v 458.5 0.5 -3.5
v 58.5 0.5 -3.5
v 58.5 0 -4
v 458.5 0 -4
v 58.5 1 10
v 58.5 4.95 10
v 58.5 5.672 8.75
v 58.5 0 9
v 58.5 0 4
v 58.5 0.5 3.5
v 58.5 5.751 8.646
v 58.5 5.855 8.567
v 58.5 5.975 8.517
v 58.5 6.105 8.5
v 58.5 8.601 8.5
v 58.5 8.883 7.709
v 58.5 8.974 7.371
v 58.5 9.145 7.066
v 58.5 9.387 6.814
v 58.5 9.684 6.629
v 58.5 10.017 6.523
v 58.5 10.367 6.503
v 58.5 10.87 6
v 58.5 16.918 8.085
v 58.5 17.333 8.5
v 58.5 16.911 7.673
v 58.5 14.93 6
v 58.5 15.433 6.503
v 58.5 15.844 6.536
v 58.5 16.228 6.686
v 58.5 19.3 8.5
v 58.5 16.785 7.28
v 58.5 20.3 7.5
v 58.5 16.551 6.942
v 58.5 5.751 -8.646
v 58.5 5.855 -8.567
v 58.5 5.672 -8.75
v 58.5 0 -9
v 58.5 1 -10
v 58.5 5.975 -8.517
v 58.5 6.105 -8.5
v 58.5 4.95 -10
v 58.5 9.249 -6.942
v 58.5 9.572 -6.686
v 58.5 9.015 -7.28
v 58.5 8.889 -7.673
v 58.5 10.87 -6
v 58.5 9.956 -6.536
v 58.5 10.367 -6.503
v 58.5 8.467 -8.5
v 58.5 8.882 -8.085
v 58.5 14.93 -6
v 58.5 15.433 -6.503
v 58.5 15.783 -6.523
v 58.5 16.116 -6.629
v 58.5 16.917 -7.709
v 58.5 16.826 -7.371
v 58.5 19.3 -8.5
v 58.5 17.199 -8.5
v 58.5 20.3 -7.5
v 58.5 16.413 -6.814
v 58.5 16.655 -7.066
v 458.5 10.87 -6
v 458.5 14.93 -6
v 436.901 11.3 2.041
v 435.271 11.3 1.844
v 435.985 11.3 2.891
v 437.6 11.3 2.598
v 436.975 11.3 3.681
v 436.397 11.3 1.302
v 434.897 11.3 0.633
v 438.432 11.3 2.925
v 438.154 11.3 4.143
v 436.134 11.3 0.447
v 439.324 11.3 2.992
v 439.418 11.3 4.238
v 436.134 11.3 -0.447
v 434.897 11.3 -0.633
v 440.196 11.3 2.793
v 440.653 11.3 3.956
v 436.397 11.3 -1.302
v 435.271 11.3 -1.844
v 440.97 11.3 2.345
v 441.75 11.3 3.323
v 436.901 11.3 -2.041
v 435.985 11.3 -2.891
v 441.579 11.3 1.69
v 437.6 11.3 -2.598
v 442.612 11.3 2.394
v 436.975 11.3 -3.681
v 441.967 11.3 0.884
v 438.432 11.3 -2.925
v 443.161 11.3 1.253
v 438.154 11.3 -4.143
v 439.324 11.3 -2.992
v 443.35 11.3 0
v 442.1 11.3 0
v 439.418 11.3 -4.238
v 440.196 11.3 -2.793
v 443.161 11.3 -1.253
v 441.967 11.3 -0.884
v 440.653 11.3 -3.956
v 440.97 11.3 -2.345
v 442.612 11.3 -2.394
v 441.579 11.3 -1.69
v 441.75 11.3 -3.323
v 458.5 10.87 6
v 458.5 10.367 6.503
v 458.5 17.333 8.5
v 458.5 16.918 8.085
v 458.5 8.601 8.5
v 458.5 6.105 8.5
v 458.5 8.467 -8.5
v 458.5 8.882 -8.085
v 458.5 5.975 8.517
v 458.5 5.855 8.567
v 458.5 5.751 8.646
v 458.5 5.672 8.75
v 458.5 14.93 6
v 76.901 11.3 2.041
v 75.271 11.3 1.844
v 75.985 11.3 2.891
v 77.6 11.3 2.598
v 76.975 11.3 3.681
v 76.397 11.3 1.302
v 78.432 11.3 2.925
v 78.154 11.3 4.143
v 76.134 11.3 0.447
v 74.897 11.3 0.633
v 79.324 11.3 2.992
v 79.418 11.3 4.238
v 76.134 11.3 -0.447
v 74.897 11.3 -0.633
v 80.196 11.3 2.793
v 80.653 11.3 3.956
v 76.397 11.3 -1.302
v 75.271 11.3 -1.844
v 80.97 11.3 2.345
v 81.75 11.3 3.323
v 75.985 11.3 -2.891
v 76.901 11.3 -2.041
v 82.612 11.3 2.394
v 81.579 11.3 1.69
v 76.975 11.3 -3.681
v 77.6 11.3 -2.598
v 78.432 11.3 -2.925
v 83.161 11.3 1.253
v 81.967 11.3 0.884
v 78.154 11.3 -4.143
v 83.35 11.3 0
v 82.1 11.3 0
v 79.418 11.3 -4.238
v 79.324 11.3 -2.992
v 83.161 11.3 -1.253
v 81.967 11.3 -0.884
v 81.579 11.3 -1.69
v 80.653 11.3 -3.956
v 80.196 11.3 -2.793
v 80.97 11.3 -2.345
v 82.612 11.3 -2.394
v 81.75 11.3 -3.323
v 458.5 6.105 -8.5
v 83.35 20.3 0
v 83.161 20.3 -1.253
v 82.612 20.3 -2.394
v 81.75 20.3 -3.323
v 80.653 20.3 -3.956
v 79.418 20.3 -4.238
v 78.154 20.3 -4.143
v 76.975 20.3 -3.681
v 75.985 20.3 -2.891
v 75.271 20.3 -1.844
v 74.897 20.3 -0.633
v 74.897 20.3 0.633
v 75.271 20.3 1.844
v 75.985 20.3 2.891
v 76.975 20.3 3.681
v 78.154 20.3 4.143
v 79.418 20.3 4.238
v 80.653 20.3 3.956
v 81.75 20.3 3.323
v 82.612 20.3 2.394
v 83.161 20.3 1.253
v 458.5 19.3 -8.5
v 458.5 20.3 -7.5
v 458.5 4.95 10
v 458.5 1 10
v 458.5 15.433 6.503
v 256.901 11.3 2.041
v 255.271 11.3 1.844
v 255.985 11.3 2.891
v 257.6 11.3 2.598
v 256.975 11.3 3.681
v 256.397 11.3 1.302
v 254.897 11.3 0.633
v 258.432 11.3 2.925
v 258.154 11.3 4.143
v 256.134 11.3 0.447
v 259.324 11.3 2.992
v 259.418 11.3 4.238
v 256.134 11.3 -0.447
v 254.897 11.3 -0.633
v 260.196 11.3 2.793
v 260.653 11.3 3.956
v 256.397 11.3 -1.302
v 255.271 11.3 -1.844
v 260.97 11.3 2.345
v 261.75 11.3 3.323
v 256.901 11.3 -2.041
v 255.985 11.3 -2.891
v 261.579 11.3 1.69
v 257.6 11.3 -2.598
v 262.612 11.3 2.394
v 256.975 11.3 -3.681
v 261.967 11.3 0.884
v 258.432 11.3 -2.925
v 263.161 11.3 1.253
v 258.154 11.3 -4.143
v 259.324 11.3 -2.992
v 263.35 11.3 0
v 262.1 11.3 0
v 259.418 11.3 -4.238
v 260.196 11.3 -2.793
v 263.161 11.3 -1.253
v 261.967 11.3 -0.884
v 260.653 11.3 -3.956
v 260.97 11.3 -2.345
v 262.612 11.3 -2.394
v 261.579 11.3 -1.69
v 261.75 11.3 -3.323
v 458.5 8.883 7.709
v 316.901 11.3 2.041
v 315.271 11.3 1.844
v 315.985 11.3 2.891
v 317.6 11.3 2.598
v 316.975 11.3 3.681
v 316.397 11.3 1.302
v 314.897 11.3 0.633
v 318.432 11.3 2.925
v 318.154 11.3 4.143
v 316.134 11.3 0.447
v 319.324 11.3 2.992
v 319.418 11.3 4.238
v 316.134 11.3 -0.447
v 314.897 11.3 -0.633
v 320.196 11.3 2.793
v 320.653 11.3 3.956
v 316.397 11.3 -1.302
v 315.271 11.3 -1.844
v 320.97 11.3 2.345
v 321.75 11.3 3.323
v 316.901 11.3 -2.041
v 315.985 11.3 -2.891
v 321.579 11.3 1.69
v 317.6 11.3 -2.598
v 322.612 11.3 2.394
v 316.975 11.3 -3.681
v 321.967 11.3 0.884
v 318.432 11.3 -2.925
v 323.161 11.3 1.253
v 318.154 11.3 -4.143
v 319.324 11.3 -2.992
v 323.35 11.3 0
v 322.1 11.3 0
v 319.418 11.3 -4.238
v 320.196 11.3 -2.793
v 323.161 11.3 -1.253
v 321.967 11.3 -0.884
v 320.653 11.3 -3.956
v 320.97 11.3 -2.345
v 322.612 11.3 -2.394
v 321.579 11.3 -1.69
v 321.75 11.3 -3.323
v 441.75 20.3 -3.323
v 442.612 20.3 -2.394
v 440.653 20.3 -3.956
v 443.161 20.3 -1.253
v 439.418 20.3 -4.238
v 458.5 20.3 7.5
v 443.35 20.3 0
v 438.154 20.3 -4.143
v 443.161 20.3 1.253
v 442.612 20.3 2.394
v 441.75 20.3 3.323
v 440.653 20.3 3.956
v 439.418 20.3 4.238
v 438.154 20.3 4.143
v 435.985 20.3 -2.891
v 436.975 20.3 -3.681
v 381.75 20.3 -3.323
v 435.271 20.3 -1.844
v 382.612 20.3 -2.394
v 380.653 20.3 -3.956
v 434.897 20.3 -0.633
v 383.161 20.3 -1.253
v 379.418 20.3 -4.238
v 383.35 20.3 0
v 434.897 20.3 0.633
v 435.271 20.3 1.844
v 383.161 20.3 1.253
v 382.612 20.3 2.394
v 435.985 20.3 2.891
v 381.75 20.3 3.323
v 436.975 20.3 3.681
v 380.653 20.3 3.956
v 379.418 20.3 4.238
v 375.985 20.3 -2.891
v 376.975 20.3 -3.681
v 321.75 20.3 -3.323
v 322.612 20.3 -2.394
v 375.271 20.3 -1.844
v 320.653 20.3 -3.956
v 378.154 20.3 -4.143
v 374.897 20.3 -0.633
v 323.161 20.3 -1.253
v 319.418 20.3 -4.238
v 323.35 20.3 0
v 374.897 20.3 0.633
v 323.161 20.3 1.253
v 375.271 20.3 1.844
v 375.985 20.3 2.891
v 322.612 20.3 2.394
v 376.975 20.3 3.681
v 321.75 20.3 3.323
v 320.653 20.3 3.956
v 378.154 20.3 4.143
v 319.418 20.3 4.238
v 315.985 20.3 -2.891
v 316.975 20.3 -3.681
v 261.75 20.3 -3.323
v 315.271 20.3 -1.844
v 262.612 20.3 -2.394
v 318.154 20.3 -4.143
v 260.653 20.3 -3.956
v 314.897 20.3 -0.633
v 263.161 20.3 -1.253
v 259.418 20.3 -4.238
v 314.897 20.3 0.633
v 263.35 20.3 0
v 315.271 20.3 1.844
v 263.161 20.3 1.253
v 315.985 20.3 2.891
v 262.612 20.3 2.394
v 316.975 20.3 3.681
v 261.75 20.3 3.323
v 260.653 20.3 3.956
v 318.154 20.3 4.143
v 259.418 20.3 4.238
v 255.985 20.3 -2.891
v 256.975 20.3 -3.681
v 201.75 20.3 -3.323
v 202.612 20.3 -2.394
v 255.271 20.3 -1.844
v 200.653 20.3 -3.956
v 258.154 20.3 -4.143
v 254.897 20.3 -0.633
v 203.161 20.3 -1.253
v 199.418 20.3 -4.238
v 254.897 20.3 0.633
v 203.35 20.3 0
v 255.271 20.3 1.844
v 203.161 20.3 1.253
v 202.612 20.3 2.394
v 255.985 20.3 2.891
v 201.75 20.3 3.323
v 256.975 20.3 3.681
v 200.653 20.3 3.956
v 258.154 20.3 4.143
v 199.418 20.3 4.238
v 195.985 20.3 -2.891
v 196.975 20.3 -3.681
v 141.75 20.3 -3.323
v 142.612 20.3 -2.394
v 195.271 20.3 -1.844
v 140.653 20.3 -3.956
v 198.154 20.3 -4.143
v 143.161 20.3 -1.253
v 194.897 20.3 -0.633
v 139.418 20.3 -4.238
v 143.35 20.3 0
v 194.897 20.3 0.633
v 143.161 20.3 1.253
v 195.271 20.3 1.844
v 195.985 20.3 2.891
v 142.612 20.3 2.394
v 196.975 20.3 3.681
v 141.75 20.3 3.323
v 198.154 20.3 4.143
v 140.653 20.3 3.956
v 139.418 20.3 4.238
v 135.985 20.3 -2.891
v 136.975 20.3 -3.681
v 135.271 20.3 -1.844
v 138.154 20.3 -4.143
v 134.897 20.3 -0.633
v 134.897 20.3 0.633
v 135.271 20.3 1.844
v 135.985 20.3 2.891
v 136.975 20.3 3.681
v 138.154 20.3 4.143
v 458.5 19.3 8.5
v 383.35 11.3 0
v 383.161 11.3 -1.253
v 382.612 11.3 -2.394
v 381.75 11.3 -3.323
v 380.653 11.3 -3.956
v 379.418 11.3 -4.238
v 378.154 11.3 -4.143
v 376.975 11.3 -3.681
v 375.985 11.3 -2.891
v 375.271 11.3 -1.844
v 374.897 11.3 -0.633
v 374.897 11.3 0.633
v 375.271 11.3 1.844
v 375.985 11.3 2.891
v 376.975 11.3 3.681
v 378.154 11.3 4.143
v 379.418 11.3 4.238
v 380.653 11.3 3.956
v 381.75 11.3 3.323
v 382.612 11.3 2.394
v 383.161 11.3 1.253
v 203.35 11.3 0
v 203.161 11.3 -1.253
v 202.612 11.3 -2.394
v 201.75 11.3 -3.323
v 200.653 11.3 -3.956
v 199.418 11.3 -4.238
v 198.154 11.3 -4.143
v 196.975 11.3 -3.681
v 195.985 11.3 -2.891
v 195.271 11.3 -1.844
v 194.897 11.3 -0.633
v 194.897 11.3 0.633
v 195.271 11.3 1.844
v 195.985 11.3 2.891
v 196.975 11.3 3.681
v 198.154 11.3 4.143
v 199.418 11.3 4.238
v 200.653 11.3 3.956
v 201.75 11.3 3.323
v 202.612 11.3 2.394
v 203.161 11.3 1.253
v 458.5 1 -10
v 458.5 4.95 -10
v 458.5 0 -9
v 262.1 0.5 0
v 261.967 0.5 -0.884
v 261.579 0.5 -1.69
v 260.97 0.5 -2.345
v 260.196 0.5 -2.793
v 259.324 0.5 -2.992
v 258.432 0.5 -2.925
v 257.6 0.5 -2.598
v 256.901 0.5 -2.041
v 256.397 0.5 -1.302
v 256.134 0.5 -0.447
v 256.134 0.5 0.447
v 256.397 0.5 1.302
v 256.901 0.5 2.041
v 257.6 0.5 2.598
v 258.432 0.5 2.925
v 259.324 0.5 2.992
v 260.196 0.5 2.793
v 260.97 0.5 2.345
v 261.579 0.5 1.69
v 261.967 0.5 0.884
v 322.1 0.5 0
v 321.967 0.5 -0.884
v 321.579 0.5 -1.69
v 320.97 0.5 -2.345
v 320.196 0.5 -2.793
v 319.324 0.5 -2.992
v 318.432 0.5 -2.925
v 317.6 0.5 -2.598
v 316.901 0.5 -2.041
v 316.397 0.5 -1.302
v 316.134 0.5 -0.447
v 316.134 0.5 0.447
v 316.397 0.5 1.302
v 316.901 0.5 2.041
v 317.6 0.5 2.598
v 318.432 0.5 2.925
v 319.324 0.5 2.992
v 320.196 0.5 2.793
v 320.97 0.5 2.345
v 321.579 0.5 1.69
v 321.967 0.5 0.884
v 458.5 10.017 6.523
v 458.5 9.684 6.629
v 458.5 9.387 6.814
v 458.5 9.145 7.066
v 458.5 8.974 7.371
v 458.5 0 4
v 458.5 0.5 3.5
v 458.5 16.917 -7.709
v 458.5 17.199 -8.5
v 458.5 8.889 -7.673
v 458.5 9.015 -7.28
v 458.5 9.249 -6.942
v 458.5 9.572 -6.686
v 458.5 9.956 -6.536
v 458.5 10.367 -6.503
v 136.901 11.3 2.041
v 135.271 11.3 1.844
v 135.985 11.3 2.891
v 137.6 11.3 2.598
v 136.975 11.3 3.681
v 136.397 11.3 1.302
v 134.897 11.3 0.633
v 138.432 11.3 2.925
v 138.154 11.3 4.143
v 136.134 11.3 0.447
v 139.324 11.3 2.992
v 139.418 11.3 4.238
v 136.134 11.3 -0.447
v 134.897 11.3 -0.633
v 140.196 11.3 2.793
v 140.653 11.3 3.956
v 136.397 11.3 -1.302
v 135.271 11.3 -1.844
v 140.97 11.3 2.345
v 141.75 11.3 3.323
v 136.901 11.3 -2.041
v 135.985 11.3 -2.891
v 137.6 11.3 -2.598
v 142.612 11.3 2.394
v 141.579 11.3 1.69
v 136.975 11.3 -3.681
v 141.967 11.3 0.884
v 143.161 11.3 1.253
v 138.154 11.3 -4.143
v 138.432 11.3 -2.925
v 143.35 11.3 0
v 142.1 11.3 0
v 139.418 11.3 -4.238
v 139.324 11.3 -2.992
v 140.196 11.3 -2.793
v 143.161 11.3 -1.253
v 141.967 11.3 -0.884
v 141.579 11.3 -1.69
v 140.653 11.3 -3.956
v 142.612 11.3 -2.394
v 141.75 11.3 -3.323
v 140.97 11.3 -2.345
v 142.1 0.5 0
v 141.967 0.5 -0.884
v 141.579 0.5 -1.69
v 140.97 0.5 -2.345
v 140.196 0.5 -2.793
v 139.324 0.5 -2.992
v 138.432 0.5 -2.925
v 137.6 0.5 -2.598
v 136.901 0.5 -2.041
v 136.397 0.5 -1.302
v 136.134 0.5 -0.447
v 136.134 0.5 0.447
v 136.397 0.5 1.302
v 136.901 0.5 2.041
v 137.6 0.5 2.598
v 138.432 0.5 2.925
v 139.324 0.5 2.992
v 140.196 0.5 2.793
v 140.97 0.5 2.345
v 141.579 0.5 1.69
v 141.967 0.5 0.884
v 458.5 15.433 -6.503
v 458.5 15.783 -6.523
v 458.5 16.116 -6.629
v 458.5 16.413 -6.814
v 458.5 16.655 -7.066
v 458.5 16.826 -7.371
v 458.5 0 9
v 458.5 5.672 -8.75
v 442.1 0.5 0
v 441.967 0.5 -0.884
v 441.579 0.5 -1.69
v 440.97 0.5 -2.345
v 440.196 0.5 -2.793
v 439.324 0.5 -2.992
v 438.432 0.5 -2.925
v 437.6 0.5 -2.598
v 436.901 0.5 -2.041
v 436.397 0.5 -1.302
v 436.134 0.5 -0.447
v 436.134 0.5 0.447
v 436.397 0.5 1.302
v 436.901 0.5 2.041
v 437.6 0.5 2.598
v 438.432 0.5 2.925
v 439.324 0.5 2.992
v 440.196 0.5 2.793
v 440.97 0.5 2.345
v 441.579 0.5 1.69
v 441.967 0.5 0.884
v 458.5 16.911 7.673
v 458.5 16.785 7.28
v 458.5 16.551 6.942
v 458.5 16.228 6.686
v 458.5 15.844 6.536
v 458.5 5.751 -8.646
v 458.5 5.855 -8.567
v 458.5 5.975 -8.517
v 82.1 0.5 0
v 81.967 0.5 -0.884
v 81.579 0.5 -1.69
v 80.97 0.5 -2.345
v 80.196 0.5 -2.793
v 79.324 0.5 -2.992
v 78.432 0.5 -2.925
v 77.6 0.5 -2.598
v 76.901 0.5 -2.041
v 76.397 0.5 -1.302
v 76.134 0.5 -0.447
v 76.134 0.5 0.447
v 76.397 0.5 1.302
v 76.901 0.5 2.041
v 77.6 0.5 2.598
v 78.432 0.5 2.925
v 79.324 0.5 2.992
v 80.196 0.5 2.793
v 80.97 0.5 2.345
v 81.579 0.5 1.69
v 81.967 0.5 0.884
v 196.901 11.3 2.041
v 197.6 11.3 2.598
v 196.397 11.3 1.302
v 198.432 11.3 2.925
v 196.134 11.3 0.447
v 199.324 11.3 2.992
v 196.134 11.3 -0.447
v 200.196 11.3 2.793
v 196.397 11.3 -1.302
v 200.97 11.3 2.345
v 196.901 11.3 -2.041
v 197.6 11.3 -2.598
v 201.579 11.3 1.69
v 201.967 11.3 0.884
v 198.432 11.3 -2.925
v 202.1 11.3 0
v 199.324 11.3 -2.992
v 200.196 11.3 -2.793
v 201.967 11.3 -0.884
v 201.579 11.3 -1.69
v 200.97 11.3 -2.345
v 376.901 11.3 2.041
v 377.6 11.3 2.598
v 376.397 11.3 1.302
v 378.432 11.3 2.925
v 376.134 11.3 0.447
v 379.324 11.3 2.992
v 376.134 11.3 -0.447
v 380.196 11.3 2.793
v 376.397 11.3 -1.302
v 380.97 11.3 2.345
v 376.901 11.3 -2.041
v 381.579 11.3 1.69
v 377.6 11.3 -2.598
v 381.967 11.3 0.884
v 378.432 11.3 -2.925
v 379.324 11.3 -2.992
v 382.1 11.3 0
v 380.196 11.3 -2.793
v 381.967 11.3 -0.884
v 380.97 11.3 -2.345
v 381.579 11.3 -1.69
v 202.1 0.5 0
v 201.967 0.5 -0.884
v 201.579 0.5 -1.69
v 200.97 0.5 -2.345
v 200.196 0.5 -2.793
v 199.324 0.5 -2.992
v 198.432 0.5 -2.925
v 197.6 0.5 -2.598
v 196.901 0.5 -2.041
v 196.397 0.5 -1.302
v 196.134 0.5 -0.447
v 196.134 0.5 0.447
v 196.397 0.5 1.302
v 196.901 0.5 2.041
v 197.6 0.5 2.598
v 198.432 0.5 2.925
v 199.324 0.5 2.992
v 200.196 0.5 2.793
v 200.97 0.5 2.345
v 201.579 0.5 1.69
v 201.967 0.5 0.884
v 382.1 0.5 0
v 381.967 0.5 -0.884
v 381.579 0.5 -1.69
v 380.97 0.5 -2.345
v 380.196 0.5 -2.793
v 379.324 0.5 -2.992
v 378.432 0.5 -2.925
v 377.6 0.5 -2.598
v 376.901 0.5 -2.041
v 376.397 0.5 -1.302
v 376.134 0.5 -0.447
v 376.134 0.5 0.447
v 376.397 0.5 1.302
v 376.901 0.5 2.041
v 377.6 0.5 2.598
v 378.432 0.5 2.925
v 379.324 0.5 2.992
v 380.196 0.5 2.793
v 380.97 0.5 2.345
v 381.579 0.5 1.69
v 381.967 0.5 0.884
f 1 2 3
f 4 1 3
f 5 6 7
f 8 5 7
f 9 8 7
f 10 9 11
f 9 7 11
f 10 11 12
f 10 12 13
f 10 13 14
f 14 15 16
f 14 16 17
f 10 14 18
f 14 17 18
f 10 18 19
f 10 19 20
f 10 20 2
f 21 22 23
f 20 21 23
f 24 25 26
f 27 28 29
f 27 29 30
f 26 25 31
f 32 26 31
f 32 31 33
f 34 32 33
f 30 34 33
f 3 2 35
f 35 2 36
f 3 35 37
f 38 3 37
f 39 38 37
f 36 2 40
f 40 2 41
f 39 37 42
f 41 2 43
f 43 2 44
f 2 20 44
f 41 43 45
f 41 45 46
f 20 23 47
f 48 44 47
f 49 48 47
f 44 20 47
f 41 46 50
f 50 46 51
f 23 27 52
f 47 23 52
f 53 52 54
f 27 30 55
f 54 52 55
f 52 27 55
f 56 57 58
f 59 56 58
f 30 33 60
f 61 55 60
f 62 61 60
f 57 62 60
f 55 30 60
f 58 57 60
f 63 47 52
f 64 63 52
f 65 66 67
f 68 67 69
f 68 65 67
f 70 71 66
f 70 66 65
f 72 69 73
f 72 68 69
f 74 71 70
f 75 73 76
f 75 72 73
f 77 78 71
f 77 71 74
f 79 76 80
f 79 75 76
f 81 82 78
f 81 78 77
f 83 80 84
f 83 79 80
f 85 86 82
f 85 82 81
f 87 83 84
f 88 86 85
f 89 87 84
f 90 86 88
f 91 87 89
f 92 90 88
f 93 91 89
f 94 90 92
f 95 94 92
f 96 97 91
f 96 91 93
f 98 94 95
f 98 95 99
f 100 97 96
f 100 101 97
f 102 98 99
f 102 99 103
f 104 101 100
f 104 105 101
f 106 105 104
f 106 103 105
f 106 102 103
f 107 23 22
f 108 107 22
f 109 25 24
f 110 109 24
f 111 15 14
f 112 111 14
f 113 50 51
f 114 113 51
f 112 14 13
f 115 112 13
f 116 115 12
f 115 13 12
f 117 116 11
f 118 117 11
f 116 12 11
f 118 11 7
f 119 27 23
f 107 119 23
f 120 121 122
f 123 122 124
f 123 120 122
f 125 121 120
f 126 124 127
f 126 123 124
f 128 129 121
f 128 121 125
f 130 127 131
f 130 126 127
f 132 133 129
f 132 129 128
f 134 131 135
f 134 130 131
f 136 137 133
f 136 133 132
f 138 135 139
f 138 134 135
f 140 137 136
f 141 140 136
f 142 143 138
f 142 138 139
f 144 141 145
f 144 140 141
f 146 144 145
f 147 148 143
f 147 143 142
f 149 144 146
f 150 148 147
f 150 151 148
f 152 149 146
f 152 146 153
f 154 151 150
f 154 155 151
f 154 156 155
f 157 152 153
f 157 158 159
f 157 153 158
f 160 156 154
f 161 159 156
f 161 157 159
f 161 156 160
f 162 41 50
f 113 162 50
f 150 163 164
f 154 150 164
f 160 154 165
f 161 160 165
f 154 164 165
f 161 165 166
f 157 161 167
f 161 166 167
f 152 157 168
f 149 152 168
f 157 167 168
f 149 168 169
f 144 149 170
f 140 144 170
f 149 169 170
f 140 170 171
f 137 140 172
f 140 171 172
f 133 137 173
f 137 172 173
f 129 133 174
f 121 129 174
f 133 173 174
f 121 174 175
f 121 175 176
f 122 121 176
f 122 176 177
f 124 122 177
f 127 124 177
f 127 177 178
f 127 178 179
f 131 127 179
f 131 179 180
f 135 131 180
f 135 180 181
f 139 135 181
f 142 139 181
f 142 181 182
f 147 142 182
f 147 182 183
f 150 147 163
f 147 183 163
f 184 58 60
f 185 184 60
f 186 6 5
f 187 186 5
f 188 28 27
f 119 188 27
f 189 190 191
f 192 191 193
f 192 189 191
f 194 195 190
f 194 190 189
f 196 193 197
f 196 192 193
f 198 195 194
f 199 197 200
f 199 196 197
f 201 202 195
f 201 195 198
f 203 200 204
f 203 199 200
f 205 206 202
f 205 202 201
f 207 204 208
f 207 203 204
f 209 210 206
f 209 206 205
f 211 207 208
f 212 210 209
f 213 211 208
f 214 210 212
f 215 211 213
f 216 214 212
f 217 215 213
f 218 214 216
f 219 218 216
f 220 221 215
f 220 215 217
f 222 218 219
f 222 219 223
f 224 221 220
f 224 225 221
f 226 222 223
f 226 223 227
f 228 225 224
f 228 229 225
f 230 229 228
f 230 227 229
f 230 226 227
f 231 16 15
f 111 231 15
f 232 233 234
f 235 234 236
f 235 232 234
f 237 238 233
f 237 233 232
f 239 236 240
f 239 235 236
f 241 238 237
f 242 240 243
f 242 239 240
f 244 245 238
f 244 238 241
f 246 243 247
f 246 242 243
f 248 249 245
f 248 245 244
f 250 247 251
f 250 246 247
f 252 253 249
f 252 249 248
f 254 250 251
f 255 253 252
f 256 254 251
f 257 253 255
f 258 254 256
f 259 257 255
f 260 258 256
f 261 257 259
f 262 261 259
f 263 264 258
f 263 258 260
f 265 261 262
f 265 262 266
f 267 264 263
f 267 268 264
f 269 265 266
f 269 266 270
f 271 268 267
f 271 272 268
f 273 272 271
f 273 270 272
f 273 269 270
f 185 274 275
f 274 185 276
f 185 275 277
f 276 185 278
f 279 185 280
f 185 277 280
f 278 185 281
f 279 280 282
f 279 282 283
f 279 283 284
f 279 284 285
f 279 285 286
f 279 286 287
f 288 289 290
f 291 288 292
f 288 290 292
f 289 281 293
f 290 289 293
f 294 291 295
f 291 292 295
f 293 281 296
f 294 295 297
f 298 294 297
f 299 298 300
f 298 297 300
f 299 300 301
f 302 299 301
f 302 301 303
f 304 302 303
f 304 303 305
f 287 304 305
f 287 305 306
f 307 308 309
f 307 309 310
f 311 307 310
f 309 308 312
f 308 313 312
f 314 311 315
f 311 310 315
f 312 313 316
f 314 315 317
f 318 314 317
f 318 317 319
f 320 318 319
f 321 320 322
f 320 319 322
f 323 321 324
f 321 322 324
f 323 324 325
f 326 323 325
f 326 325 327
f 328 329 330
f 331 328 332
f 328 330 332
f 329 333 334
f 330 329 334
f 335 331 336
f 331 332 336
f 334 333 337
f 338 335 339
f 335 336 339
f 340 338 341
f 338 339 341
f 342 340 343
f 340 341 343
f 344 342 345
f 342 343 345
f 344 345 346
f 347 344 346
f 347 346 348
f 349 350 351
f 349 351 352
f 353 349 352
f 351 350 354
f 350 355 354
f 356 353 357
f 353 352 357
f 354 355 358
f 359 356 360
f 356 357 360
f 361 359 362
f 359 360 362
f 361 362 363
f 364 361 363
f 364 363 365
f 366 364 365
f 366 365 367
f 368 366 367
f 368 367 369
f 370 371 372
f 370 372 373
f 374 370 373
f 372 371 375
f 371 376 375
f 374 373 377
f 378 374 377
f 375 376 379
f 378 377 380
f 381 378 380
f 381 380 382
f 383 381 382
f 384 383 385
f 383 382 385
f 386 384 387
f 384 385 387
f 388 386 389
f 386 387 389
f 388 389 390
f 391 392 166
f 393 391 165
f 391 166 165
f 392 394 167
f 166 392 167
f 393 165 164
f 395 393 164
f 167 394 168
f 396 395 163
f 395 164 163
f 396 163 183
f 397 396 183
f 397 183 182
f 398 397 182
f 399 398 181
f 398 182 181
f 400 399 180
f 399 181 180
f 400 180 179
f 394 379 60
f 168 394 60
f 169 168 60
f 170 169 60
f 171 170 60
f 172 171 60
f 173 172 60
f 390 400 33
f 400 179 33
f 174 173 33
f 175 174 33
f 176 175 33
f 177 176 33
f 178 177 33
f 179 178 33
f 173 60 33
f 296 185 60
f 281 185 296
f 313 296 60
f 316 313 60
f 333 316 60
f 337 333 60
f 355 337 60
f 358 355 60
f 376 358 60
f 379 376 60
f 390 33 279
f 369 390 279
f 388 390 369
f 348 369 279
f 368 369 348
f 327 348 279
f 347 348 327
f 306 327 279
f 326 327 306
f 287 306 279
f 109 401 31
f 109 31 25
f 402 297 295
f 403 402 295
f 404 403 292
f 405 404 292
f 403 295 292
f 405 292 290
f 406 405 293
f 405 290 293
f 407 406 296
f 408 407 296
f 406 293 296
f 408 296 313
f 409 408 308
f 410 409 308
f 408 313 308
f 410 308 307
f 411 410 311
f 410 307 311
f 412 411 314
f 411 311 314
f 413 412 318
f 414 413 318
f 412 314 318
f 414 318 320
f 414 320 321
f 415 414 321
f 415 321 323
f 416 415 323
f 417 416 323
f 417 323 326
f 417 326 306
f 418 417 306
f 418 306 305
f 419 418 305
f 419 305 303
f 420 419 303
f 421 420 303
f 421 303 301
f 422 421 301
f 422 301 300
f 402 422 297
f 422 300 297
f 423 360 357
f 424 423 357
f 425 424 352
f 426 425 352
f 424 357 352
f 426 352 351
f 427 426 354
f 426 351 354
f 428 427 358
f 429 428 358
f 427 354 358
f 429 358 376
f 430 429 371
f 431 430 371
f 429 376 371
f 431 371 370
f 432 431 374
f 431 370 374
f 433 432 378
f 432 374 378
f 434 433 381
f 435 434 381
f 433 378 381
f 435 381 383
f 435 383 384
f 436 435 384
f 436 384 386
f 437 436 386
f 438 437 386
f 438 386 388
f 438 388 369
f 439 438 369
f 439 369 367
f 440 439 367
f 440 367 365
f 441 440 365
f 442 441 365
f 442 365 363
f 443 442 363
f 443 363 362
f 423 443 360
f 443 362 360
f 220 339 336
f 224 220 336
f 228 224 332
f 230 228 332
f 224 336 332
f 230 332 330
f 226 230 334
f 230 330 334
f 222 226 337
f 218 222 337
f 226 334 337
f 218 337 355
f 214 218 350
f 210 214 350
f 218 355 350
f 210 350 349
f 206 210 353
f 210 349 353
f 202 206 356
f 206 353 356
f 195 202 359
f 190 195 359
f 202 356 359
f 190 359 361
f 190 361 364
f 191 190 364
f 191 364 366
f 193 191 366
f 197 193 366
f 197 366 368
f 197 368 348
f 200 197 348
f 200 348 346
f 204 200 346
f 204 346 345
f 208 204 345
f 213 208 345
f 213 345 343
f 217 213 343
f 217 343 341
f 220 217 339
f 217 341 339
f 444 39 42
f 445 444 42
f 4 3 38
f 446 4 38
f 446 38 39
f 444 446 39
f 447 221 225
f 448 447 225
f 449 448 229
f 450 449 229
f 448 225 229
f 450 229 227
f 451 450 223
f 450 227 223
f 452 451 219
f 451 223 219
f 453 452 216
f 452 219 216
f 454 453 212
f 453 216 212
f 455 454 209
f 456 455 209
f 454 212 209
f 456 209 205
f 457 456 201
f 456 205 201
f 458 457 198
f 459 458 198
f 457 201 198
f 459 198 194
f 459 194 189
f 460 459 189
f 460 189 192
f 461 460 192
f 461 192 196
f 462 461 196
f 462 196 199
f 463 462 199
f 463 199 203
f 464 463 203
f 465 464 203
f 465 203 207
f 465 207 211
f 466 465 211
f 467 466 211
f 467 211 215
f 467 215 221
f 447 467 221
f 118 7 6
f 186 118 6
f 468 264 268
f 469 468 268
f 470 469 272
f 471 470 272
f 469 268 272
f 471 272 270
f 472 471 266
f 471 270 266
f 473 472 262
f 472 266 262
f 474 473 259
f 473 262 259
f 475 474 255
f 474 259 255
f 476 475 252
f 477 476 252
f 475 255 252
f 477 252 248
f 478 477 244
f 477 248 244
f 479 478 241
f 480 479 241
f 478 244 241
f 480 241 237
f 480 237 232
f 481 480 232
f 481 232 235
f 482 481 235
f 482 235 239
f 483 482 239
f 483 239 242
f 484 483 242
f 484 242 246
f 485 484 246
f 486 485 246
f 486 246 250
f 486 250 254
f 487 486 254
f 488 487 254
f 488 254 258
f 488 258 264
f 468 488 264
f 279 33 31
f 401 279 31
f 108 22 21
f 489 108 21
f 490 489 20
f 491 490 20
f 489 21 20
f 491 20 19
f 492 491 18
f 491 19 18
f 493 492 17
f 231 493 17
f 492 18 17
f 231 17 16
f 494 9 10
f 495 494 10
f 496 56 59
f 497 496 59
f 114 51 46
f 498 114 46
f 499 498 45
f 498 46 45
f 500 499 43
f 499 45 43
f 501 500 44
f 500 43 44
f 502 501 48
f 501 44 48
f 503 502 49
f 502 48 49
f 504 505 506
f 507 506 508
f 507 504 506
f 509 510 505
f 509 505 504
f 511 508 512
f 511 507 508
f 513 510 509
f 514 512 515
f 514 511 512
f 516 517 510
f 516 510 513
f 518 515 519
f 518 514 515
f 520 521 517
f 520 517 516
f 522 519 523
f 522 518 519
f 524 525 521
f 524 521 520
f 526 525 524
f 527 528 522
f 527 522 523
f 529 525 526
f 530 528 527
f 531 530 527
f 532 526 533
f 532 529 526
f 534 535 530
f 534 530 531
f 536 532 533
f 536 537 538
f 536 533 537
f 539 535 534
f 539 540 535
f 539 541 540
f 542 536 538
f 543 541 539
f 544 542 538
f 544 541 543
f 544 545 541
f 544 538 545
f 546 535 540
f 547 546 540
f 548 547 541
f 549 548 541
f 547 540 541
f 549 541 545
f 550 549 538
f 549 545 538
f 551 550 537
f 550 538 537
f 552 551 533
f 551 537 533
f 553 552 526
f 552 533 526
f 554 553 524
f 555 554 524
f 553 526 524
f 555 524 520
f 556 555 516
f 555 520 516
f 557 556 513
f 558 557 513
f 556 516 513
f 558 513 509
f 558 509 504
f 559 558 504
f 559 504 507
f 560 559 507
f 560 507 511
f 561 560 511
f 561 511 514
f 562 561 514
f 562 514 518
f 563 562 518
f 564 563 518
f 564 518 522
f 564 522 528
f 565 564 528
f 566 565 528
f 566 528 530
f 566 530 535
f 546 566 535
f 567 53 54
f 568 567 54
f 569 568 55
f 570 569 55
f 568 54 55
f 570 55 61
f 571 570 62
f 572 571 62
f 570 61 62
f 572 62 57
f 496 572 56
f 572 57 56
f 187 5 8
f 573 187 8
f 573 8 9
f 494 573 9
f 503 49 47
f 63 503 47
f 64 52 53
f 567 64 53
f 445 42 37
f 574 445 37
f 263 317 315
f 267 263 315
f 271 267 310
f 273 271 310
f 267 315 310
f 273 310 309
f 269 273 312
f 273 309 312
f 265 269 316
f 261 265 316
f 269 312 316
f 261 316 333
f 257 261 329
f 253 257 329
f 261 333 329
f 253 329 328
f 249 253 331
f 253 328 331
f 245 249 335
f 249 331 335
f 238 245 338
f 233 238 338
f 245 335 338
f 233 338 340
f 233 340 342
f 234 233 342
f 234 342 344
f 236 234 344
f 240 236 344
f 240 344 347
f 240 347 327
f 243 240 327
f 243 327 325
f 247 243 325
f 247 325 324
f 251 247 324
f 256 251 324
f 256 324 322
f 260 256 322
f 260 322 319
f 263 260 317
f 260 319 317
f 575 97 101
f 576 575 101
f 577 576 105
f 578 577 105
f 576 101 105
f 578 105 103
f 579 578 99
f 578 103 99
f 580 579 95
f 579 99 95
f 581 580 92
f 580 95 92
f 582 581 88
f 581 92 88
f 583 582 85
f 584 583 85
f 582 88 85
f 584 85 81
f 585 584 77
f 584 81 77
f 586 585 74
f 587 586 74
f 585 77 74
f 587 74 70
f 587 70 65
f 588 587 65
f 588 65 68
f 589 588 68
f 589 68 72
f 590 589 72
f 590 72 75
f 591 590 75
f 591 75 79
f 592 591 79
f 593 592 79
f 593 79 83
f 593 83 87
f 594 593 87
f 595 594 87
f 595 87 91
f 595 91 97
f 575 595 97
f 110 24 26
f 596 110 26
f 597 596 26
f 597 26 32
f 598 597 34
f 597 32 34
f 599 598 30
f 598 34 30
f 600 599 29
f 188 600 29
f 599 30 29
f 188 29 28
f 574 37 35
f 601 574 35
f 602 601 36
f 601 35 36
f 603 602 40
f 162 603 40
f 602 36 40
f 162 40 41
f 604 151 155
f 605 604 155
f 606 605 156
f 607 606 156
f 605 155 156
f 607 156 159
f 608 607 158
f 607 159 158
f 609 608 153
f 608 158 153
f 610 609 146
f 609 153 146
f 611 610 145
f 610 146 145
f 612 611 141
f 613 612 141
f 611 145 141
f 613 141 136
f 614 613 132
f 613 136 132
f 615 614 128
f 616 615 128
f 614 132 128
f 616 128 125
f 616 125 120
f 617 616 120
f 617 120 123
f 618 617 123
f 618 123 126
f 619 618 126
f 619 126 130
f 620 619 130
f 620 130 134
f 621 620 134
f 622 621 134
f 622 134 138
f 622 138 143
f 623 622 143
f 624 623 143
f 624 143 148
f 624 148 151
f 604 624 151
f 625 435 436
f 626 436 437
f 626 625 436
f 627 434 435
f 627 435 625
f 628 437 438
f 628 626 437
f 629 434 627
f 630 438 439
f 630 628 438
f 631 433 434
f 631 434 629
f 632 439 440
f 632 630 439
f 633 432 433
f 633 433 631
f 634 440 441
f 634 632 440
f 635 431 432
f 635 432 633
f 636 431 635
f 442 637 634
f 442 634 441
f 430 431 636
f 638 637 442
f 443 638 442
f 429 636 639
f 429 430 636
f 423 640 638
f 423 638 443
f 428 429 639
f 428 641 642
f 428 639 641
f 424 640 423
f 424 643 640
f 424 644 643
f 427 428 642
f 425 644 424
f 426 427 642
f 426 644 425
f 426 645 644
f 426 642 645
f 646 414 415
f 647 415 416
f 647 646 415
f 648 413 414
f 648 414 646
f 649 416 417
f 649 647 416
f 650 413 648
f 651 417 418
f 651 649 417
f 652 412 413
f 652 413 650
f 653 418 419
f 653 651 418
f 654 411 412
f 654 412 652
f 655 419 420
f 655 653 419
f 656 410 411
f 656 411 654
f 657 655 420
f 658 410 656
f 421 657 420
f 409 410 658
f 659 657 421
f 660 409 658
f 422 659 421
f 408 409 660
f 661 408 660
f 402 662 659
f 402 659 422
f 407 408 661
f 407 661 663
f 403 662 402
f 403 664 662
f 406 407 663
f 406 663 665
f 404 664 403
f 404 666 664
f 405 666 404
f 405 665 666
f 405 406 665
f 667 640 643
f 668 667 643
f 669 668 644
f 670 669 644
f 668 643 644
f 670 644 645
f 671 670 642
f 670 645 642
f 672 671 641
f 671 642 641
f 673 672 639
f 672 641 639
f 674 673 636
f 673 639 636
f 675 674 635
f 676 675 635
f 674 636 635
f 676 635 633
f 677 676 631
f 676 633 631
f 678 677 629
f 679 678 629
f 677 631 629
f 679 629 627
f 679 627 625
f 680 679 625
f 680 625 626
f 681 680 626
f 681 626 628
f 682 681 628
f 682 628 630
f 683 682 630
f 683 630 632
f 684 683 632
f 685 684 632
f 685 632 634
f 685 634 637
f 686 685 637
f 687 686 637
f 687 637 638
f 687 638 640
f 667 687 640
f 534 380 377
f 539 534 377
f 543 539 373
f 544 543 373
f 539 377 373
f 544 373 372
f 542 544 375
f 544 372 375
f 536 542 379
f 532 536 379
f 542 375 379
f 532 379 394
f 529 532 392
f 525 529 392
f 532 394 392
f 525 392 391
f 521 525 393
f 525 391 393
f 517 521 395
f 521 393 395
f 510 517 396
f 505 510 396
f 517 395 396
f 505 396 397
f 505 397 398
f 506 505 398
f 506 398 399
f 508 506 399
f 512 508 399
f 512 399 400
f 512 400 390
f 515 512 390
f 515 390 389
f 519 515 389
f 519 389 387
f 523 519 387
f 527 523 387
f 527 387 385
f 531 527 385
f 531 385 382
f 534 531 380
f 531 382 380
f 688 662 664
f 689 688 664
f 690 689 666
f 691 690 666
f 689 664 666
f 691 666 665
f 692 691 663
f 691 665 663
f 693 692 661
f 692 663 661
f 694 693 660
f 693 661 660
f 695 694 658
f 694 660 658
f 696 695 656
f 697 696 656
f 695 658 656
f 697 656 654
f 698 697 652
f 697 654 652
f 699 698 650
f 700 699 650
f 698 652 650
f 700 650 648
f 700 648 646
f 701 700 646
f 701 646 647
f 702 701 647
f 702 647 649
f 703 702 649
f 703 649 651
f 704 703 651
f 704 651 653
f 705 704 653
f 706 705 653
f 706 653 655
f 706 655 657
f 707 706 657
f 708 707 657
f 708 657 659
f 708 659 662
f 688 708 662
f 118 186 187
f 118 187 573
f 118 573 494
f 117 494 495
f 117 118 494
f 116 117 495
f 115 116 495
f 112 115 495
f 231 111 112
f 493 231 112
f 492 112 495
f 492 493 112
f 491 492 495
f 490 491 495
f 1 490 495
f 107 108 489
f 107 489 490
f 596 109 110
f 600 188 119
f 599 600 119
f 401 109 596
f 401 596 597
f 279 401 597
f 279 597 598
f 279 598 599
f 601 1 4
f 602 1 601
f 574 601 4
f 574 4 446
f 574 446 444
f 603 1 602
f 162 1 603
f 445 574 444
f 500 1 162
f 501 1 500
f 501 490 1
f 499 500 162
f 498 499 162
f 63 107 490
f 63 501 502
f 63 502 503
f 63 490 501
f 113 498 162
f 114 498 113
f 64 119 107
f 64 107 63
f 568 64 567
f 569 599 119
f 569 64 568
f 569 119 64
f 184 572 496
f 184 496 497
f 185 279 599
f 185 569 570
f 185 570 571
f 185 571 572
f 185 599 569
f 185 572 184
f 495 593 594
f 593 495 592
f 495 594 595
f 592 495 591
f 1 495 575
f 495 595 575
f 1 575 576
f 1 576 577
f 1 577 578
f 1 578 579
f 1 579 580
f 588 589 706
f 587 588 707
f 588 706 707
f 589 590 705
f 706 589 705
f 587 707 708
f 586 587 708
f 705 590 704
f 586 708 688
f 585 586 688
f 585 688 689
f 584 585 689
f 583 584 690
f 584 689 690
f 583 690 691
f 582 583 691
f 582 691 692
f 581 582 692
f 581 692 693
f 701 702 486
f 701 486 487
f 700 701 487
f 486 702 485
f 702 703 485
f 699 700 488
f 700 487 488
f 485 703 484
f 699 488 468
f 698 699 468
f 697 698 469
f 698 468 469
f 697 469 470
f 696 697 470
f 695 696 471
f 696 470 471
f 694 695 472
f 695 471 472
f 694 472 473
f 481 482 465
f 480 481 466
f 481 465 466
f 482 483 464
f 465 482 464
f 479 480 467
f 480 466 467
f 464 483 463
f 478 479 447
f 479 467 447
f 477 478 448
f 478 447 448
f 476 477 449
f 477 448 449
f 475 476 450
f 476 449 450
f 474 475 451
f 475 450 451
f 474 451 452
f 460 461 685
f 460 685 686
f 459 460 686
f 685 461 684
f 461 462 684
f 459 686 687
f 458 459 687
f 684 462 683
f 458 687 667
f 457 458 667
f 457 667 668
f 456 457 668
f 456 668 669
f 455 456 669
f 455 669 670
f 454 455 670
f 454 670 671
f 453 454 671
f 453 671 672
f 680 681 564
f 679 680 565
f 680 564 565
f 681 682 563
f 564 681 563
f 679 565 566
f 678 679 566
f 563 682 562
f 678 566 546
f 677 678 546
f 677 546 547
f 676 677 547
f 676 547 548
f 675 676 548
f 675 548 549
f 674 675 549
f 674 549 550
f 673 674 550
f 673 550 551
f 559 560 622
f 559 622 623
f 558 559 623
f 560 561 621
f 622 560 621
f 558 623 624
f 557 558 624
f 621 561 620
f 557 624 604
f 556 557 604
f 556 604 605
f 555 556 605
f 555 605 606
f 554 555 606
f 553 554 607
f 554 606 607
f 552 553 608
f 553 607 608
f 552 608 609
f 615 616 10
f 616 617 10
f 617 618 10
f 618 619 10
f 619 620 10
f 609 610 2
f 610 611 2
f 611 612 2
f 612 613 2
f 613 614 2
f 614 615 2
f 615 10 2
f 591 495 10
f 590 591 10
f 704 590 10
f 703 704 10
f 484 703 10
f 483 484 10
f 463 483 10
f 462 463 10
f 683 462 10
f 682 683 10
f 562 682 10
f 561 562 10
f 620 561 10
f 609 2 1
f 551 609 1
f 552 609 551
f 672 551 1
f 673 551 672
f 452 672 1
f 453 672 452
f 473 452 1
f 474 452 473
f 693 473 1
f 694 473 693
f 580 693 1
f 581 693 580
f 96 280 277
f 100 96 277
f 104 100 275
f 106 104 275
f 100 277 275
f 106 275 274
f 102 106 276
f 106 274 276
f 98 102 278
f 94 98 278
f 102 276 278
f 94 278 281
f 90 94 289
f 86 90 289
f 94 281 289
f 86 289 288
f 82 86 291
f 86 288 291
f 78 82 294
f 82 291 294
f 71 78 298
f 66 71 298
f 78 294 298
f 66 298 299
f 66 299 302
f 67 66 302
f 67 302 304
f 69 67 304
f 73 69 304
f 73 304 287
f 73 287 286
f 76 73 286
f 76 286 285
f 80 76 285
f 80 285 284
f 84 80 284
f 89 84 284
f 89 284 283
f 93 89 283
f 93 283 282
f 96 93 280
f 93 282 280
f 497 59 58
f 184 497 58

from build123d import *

# Parameters (mm, degrees)
BOSS_EXTRUDE5_DEPTH = 400
SKETCH8_R           = 4.25
CUT_EXTRUDE1_DEPTH  = 9
SKETCH9_R           = 3
CUT_EXTRUDE2_DEPTH  = 12.3
LPATTERN1_COUNT     = 20
LPATTERN1_PITCH     = 60


with BuildPart() as part:
    # Sketch7 → Boss-Extrude5 (new body)
    with BuildSketch(Plane(origin=(58.5, 0, 0), x_dir=(0, 0, -1), z_dir=(1, 0, 0))):
        with BuildLine():
            Line((-7.709038211, 8.883084864), (-8.5, 8.601077183))
            Line((-8.5, 8.601077183), (-8.5, 6.104700538))
            ThreePointArc((-8.5, 6.104700538), (-8.566987298, 5.854700538), (-8.75, 5.671687836))
            Line((-8.75, 5.671687836), (-10, 4.95))
            Line((-10, 4.95), (-10, 1))
            Line((-10, 1), (-9, 0))
            Line((-9, 0), (-4, 0))
            Line((-4, 0), (-3.5, 0.5))
            Line((-3.5, 0.5), (3.5, 0.5))
            Line((3.5, 0.5), (4, 0))
            Line((4, 0), (9, 0))
            Line((9, 0), (10, 1))
            Line((10, 1), (10, 4.95))
            Line((10, 4.95), (8.75, 5.671687836))
            ThreePointArc((8.75, 5.671687836), (8.566987298, 5.854700538), (8.5, 6.104700538))
            Line((8.5, 6.104700538), (8.5, 8.46691323))
            Line((8.5, 8.46691323), (8.084678947, 8.882234283))
            ThreePointArc((8.084678947, 8.882234283), (6.941822875, 9.249266637), (6.503340774, 10.366659226))
            Line((6.503340774, 10.366659226), (6, 10.87))
            Line((6, 10.87), (6, 14.93))
            Line((6, 14.93), (6.503340774, 15.433340774))
            ThreePointArc((6.503340774, 15.433340774), (6.813545517, 16.412959034), (7.709038211, 16.916915136))
            Line((7.709038211, 16.916915136), (8.5, 17.198922817))
            Line((8.5, 17.198922817), (8.5, 19.3))
            Line((8.5, 19.3), (7.5, 20.3))
            Line((7.5, 20.3), (-7.5, 20.3))
            Line((-7.5, 20.3), (-8.5, 19.3))
            Line((-8.5, 19.3), (-8.5, 17.33308677))
            Line((-8.5, 17.33308677), (-8.084678947, 16.917765717))
            ThreePointArc((-8.084678947, 16.917765717), (-6.941822875, 16.550733363), (-6.503340774, 15.433340774))
            Line((-6.503340774, 15.433340774), (-6, 14.93))
            Line((-6, 14.93), (-6, 10.87))
            Line((-6, 10.87), (-6.503340774, 10.366659226))
            ThreePointArc((-6.503340774, 10.366659226), (-6.813545517, 9.387040966), (-7.709038211, 8.883084864))
        make_face()
    extrude(amount=BOSS_EXTRUDE5_DEPTH)

    # Sketch8 → Cut-Extrude1 (cut)
    with BuildSketch(Plane(origin=(0, 20.3, 0), x_dir=(1, 0, 0), z_dir=(0, 1, 0))):
        with Locations((79.1, 0)):
            Circle(SKETCH8_R)
    cut_extrude1 = extrude(amount=-CUT_EXTRUDE1_DEPTH, mode=Mode.SUBTRACT)

    # Sketch9 → Cut-Extrude2 (cut, through all)
    with BuildSketch(Plane(origin=(0, 11.3, 0), x_dir=(1, 0, 0), z_dir=(0, 1, 0))):
        with Locations((79.1, 0)):
            Circle(SKETCH9_R)
    cut_extrude2 = extrude(amount=-CUT_EXTRUDE2_DEPTH, mode=Mode.SUBTRACT)

    # LPattern1: Cut-Extrude1, Cut-Extrude2 ×20
    with Locations(*[(i * LPATTERN1_PITCH, 0, 0) for i in range(1, LPATTERN1_COUNT)]):
        add(cut_extrude1, mode=Mode.SUBTRACT)
        add(cut_extrude2, mode=Mode.SUBTRACT)


solid = part.part
